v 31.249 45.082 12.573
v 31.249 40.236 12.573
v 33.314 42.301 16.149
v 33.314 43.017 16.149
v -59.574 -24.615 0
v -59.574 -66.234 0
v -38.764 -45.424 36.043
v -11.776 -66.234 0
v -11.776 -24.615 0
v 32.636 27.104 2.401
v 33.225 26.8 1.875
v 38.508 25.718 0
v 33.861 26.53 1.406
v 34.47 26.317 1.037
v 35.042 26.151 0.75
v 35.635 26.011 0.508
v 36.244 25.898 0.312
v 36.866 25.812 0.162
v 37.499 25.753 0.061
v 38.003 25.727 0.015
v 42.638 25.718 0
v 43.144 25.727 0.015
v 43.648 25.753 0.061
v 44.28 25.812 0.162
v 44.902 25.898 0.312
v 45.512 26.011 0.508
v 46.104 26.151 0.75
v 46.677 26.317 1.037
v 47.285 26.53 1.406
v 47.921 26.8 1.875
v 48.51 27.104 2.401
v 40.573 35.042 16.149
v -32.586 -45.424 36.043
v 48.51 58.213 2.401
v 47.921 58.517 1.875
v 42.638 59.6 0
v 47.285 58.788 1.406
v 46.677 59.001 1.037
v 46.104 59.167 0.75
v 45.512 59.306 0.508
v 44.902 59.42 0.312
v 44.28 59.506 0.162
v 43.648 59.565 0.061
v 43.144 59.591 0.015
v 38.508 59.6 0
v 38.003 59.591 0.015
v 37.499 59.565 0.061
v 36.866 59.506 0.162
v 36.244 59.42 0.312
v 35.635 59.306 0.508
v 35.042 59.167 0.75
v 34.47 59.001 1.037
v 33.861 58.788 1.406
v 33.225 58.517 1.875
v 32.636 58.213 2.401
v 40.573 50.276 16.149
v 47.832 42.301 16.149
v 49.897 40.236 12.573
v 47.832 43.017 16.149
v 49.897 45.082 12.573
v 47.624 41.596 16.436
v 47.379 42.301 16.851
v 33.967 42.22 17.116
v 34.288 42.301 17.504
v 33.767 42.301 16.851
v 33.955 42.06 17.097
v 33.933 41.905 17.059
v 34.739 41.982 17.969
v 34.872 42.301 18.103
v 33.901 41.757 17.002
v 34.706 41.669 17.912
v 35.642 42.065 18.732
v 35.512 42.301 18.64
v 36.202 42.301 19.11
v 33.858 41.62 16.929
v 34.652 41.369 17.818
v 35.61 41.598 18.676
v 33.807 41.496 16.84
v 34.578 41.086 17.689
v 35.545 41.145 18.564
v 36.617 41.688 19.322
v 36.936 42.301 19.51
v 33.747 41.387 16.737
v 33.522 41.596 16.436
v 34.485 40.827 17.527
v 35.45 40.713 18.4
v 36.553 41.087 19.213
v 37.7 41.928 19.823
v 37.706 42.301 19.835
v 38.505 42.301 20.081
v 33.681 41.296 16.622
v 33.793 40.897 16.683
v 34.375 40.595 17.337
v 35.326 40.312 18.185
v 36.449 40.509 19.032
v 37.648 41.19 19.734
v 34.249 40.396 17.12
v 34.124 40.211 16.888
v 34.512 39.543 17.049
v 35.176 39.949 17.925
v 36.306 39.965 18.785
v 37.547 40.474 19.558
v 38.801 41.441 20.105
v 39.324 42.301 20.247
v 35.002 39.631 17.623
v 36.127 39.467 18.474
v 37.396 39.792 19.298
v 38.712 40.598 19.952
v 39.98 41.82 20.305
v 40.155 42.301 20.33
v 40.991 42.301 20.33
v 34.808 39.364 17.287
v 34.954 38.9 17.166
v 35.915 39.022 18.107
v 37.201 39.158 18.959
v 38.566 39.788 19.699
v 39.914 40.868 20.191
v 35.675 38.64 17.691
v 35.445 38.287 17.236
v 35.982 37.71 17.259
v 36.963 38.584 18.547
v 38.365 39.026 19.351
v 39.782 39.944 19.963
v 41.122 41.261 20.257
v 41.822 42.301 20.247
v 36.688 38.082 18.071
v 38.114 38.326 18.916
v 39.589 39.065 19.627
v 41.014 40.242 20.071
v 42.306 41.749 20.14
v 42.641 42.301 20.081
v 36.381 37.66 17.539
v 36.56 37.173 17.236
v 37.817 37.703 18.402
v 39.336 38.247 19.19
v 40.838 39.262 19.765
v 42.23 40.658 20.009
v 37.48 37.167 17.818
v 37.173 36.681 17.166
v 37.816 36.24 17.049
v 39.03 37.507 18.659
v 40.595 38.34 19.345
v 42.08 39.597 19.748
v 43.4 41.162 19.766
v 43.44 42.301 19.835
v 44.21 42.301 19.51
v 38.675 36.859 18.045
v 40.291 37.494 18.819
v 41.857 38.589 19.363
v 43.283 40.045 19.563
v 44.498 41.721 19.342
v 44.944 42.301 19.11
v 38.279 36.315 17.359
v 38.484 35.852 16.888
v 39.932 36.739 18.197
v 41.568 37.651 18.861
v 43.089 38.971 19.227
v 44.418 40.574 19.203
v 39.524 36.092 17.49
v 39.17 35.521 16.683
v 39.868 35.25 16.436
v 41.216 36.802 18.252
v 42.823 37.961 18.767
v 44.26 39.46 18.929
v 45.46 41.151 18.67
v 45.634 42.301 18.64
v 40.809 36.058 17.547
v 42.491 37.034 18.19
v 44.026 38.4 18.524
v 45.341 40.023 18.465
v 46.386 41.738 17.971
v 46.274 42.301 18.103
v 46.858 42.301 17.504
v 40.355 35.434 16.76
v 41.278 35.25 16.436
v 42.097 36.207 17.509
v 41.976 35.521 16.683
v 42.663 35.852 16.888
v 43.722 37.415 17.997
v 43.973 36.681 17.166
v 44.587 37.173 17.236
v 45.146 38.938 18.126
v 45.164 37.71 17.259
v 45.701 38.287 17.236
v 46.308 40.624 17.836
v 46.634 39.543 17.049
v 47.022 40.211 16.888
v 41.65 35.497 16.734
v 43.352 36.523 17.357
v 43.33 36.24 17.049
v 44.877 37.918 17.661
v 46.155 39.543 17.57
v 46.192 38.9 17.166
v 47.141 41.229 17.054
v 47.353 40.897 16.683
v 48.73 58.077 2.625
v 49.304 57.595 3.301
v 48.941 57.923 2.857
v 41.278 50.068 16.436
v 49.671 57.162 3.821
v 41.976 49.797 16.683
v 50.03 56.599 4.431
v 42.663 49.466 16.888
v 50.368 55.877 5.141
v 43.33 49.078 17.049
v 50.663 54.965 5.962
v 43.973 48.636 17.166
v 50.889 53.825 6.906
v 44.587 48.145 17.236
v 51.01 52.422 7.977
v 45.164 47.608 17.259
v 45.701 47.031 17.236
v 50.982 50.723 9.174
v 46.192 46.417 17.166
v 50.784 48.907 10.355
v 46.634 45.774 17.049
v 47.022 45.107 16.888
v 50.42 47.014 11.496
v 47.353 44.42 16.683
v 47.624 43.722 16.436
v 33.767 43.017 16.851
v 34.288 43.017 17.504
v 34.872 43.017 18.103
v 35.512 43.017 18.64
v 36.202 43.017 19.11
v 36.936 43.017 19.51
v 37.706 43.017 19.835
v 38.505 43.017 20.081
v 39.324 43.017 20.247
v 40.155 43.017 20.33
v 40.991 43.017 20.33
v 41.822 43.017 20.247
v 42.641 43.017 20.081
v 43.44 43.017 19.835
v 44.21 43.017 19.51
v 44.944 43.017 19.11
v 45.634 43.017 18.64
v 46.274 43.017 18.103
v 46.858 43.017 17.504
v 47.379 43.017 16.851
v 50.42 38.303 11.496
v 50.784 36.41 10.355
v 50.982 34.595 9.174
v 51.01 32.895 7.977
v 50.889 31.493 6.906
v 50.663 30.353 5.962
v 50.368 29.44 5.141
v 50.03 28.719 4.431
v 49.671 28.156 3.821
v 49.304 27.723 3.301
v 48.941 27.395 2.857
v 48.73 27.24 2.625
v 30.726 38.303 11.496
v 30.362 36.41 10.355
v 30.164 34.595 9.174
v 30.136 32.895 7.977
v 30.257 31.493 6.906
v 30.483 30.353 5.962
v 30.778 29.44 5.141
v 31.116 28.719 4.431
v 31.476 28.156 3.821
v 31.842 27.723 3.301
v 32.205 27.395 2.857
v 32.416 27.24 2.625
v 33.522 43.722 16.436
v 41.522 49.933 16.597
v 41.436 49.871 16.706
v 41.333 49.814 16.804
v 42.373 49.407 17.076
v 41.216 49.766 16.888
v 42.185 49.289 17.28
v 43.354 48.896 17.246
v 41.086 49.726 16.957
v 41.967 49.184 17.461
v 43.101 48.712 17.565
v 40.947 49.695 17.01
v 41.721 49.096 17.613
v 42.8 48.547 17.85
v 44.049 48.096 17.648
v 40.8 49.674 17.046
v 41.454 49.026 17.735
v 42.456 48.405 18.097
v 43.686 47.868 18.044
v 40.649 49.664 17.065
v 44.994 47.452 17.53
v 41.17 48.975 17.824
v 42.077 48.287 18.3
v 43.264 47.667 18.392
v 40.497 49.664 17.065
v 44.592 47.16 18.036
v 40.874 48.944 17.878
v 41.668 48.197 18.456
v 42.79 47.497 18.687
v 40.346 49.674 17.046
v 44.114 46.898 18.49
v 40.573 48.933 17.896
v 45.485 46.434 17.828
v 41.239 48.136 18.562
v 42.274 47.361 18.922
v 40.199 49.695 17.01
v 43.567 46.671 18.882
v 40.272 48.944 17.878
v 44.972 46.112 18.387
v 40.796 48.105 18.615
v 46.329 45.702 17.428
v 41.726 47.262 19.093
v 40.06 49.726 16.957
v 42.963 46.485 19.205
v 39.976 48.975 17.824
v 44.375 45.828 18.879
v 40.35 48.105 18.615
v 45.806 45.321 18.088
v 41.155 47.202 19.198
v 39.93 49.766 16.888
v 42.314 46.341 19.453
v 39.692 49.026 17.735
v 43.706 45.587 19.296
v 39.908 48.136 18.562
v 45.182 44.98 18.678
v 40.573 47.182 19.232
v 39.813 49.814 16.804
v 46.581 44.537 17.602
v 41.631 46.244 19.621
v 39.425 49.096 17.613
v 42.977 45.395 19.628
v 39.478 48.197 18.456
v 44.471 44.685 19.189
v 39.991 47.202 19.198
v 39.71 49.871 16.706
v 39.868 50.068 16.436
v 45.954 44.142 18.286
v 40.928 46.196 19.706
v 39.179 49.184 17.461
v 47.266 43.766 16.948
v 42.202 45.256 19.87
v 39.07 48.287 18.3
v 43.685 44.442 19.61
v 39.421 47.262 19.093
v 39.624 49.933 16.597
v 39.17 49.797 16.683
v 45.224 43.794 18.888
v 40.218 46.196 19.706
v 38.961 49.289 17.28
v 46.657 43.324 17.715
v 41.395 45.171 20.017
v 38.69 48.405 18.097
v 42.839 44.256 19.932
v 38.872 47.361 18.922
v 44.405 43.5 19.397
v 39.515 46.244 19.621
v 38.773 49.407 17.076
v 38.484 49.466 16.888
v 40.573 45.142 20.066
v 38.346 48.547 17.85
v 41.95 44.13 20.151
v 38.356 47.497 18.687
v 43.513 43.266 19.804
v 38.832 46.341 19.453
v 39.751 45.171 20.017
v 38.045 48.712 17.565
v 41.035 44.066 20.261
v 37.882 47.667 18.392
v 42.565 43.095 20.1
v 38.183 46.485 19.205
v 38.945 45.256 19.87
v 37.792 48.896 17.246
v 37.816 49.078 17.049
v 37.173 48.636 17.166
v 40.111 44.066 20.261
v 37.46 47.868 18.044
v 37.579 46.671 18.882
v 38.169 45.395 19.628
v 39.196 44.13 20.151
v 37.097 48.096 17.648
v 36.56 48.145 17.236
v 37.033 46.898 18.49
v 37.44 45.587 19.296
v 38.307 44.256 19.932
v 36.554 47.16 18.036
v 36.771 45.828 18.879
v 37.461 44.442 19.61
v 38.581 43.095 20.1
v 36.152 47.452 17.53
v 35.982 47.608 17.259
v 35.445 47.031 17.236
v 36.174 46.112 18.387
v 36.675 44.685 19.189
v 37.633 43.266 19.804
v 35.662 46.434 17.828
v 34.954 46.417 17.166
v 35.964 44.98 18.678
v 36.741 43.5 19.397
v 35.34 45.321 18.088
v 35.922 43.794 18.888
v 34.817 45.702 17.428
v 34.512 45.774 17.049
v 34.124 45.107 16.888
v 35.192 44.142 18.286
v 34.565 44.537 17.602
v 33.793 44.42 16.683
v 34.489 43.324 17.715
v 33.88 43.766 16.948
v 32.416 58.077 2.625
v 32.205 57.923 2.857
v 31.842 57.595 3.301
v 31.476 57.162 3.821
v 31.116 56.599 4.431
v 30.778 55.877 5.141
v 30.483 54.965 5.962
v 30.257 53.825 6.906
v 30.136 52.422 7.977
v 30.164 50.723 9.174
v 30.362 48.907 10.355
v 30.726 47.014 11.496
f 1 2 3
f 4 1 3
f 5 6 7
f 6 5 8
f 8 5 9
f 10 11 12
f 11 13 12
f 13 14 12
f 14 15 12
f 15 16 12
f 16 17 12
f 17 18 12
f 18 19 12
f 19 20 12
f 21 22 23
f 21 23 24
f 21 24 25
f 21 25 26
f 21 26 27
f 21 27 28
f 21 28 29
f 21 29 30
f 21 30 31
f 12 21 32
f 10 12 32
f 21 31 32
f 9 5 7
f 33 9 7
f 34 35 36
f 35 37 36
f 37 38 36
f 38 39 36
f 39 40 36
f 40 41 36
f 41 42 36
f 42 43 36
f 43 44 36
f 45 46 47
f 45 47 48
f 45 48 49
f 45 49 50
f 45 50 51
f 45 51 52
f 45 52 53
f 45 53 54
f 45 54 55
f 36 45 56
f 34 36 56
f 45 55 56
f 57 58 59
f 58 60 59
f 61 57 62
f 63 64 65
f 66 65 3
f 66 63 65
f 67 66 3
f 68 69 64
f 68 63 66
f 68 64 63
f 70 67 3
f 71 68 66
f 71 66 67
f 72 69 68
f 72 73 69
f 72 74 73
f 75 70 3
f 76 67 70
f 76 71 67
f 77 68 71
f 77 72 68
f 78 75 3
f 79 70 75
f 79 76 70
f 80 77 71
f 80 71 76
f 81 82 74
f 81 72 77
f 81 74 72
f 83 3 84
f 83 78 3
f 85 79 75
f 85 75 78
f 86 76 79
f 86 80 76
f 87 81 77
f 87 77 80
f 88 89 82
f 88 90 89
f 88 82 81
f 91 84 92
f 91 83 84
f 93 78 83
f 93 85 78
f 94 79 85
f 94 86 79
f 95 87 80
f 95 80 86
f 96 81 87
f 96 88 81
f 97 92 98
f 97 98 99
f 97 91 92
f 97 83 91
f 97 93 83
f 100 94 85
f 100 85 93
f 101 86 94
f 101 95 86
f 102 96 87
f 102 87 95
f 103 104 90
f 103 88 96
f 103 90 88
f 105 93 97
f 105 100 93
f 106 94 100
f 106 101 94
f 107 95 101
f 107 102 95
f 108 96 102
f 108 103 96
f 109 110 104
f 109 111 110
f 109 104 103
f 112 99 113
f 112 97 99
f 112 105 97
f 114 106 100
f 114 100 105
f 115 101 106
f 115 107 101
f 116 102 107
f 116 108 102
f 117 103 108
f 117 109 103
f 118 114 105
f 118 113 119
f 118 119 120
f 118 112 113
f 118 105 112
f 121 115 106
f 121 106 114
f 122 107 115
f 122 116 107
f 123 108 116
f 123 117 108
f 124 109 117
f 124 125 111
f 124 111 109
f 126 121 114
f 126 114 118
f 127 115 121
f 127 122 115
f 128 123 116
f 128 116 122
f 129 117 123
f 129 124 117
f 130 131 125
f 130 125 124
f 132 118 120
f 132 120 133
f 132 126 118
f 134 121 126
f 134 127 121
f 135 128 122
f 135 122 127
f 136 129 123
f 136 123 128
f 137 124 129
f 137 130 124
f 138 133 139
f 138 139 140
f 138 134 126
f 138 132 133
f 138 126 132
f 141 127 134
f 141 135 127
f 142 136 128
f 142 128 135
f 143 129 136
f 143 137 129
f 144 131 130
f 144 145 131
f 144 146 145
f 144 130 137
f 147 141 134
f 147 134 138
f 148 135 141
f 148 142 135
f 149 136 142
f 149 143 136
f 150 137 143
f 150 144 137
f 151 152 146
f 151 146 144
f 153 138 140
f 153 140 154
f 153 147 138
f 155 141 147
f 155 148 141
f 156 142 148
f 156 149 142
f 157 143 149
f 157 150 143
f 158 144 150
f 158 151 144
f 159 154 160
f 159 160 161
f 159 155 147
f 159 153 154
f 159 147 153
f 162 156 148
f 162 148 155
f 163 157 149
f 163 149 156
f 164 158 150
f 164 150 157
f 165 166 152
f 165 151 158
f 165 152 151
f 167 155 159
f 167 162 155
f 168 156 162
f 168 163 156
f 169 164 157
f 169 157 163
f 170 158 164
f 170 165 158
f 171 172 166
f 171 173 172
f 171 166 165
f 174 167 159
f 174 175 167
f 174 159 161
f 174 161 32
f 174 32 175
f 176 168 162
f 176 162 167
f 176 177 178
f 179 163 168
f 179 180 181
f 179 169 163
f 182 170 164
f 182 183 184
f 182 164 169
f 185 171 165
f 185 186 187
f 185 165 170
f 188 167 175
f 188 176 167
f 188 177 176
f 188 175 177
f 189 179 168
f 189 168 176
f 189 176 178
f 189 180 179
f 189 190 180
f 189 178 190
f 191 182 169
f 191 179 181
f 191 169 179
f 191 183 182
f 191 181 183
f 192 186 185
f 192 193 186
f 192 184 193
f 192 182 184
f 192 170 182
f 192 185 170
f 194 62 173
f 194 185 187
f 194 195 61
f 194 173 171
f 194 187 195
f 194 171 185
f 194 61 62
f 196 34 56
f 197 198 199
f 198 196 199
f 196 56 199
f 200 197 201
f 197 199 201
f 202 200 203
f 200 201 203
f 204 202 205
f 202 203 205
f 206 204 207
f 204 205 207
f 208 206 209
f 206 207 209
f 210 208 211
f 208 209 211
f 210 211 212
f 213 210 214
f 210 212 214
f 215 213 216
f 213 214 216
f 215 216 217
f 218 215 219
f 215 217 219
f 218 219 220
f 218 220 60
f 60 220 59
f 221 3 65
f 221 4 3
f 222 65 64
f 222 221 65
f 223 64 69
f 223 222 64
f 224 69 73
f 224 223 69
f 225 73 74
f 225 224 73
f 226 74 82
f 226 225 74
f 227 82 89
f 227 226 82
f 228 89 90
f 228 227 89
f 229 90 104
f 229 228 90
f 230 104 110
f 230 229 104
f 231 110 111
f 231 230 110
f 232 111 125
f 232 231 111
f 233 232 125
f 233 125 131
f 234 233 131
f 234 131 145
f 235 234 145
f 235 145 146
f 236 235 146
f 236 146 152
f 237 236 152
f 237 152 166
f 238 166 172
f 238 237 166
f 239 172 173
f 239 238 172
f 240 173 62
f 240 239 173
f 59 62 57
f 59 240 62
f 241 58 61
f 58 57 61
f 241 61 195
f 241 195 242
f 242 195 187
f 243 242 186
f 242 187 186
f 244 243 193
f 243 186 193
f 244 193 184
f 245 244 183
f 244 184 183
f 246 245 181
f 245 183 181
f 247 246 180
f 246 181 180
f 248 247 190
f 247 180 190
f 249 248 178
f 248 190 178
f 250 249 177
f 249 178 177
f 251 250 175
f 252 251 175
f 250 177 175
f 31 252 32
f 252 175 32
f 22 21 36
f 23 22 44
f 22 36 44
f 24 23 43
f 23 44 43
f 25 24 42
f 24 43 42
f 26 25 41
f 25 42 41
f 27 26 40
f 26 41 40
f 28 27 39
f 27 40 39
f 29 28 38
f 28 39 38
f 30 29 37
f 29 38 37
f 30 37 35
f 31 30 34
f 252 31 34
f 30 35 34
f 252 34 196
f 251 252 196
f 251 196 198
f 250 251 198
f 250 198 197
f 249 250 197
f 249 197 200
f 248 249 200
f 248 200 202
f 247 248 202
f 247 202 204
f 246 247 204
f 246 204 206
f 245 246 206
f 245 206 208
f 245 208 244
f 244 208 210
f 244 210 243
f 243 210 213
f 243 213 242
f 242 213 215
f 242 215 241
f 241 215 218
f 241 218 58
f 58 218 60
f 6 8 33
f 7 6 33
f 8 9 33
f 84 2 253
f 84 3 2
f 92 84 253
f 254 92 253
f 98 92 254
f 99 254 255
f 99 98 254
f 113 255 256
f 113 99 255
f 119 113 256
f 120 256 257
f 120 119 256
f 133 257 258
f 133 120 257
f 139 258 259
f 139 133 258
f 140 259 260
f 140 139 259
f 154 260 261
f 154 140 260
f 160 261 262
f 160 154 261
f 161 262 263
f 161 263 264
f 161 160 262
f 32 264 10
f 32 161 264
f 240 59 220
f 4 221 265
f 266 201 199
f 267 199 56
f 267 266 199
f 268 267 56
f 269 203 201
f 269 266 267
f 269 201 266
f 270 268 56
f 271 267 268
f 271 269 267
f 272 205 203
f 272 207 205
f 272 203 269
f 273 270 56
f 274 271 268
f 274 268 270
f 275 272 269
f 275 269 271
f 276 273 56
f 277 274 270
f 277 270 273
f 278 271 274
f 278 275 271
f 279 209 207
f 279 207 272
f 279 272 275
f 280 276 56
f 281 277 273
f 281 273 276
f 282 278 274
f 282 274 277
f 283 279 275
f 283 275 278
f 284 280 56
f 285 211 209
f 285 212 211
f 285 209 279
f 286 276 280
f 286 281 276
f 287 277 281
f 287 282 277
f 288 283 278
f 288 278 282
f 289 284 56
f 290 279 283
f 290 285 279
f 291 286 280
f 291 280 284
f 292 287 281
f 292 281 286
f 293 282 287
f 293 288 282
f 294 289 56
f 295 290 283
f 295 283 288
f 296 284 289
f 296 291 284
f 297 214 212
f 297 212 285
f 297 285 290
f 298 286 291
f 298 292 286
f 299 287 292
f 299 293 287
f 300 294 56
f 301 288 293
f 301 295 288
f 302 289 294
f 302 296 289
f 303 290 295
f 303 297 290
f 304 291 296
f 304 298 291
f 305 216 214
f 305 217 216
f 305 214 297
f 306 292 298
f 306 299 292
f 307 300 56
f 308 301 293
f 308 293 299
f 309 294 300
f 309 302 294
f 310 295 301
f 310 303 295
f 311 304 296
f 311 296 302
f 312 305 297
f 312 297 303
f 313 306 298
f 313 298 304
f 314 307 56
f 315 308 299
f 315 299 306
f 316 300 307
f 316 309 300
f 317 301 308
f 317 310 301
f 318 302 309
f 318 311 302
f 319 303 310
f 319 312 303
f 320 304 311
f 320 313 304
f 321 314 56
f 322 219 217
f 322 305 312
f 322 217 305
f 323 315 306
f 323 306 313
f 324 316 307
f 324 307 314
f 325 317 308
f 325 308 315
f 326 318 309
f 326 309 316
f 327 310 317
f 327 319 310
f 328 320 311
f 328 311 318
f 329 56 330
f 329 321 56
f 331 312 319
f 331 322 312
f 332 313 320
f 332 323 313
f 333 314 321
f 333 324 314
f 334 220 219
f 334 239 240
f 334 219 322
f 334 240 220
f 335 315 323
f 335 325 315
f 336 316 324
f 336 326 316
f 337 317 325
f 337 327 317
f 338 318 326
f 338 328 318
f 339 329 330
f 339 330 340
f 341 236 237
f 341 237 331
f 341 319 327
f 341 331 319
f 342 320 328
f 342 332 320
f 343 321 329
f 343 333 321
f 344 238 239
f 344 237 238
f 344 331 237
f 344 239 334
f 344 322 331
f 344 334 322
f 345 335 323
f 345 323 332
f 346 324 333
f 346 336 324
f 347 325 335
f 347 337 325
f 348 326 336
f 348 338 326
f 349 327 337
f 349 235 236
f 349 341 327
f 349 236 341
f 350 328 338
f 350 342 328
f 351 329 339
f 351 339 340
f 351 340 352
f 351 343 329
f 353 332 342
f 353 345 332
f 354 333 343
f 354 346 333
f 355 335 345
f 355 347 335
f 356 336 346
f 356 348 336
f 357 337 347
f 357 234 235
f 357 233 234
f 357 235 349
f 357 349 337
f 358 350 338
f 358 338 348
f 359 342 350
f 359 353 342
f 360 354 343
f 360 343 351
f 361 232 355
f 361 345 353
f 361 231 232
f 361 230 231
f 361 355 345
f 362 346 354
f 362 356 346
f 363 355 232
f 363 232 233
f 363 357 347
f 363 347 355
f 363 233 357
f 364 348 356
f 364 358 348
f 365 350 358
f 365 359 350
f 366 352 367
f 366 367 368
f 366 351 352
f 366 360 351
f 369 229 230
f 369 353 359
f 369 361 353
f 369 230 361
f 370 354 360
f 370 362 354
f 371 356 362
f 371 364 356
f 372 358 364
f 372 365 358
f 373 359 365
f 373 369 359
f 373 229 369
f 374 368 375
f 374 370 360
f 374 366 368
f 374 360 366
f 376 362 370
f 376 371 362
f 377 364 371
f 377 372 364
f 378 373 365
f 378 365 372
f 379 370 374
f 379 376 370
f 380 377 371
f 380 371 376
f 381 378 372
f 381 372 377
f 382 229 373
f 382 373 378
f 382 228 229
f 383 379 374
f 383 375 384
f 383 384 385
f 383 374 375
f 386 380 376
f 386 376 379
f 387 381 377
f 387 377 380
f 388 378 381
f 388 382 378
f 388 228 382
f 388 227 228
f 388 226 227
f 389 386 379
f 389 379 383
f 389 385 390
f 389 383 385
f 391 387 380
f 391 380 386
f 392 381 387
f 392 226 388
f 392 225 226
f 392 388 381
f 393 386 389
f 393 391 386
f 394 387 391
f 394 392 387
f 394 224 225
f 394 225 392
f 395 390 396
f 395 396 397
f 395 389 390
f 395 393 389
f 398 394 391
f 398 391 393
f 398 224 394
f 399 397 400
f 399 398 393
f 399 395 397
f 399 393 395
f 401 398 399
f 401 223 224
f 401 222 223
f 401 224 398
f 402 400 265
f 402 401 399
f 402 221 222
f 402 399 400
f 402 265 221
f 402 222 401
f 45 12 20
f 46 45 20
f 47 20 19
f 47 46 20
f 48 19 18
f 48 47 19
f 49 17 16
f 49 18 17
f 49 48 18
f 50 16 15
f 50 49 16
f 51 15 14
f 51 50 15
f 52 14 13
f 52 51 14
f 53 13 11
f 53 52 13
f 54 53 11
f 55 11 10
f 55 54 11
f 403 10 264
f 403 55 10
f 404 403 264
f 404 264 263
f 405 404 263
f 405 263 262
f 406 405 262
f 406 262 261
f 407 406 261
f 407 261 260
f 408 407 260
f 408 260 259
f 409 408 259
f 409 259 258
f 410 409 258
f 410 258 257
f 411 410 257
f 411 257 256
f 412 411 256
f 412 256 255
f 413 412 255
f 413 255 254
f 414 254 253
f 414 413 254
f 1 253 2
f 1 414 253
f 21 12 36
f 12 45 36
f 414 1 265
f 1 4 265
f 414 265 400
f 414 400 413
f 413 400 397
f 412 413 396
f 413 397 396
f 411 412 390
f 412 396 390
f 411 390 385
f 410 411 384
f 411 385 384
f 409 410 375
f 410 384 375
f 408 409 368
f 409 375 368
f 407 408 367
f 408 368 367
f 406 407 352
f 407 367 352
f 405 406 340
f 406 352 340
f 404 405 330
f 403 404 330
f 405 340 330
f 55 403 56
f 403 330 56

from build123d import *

# Parameters (mm, degrees)
F0_W     = 47.7973278612
F0_H     = 41.6194405407
F1_DEPTH = 67.564
F1_TAPER = 30
F0_W_2   = 33.1654958427
F0_H_2   = 33.8819082826
F2_R     = 8.382


with BuildPart() as f1:
    # F0 (on Top) → F1 (new body)
    with BuildSketch(Plane.XY):
        with Locations((-35.6750460342, -45.4242425039)):
            Rectangle(F0_W, F0_H)
    extrude(amount=F1_DEPTH, taper=F1_TAPER)


with BuildPart() as f1b:
    # F0 (on Top) → F1, piece 2 (new body)
    with BuildSketch(Plane.XY):
        with Locations((40.5730735511, 42.6588663831)):
            Rectangle(F0_W_2, F0_H_2)
    extrude(amount=F1_DEPTH, taper=F1_TAPER)

    # F2
    f2_edges = [f1b.edges().sort_by_distance(p)[0] for p in [
        (48.864446, 34.009287, 14.361083),
        (40.573074, 42.658866, 28.722162),
        (48.864447, 51.308446, 14.361082),
        (57.155821, 42.658866, 0),
        (32.2817, 34.009287, 14.361082),
        (32.2817, 51.308446, 14.361082),
        (23.990326, 42.658866, 0),
    ]]
    fillet(f2_edges, radius=F2_R)


solid = Compound([f1.part, f1b.part])
